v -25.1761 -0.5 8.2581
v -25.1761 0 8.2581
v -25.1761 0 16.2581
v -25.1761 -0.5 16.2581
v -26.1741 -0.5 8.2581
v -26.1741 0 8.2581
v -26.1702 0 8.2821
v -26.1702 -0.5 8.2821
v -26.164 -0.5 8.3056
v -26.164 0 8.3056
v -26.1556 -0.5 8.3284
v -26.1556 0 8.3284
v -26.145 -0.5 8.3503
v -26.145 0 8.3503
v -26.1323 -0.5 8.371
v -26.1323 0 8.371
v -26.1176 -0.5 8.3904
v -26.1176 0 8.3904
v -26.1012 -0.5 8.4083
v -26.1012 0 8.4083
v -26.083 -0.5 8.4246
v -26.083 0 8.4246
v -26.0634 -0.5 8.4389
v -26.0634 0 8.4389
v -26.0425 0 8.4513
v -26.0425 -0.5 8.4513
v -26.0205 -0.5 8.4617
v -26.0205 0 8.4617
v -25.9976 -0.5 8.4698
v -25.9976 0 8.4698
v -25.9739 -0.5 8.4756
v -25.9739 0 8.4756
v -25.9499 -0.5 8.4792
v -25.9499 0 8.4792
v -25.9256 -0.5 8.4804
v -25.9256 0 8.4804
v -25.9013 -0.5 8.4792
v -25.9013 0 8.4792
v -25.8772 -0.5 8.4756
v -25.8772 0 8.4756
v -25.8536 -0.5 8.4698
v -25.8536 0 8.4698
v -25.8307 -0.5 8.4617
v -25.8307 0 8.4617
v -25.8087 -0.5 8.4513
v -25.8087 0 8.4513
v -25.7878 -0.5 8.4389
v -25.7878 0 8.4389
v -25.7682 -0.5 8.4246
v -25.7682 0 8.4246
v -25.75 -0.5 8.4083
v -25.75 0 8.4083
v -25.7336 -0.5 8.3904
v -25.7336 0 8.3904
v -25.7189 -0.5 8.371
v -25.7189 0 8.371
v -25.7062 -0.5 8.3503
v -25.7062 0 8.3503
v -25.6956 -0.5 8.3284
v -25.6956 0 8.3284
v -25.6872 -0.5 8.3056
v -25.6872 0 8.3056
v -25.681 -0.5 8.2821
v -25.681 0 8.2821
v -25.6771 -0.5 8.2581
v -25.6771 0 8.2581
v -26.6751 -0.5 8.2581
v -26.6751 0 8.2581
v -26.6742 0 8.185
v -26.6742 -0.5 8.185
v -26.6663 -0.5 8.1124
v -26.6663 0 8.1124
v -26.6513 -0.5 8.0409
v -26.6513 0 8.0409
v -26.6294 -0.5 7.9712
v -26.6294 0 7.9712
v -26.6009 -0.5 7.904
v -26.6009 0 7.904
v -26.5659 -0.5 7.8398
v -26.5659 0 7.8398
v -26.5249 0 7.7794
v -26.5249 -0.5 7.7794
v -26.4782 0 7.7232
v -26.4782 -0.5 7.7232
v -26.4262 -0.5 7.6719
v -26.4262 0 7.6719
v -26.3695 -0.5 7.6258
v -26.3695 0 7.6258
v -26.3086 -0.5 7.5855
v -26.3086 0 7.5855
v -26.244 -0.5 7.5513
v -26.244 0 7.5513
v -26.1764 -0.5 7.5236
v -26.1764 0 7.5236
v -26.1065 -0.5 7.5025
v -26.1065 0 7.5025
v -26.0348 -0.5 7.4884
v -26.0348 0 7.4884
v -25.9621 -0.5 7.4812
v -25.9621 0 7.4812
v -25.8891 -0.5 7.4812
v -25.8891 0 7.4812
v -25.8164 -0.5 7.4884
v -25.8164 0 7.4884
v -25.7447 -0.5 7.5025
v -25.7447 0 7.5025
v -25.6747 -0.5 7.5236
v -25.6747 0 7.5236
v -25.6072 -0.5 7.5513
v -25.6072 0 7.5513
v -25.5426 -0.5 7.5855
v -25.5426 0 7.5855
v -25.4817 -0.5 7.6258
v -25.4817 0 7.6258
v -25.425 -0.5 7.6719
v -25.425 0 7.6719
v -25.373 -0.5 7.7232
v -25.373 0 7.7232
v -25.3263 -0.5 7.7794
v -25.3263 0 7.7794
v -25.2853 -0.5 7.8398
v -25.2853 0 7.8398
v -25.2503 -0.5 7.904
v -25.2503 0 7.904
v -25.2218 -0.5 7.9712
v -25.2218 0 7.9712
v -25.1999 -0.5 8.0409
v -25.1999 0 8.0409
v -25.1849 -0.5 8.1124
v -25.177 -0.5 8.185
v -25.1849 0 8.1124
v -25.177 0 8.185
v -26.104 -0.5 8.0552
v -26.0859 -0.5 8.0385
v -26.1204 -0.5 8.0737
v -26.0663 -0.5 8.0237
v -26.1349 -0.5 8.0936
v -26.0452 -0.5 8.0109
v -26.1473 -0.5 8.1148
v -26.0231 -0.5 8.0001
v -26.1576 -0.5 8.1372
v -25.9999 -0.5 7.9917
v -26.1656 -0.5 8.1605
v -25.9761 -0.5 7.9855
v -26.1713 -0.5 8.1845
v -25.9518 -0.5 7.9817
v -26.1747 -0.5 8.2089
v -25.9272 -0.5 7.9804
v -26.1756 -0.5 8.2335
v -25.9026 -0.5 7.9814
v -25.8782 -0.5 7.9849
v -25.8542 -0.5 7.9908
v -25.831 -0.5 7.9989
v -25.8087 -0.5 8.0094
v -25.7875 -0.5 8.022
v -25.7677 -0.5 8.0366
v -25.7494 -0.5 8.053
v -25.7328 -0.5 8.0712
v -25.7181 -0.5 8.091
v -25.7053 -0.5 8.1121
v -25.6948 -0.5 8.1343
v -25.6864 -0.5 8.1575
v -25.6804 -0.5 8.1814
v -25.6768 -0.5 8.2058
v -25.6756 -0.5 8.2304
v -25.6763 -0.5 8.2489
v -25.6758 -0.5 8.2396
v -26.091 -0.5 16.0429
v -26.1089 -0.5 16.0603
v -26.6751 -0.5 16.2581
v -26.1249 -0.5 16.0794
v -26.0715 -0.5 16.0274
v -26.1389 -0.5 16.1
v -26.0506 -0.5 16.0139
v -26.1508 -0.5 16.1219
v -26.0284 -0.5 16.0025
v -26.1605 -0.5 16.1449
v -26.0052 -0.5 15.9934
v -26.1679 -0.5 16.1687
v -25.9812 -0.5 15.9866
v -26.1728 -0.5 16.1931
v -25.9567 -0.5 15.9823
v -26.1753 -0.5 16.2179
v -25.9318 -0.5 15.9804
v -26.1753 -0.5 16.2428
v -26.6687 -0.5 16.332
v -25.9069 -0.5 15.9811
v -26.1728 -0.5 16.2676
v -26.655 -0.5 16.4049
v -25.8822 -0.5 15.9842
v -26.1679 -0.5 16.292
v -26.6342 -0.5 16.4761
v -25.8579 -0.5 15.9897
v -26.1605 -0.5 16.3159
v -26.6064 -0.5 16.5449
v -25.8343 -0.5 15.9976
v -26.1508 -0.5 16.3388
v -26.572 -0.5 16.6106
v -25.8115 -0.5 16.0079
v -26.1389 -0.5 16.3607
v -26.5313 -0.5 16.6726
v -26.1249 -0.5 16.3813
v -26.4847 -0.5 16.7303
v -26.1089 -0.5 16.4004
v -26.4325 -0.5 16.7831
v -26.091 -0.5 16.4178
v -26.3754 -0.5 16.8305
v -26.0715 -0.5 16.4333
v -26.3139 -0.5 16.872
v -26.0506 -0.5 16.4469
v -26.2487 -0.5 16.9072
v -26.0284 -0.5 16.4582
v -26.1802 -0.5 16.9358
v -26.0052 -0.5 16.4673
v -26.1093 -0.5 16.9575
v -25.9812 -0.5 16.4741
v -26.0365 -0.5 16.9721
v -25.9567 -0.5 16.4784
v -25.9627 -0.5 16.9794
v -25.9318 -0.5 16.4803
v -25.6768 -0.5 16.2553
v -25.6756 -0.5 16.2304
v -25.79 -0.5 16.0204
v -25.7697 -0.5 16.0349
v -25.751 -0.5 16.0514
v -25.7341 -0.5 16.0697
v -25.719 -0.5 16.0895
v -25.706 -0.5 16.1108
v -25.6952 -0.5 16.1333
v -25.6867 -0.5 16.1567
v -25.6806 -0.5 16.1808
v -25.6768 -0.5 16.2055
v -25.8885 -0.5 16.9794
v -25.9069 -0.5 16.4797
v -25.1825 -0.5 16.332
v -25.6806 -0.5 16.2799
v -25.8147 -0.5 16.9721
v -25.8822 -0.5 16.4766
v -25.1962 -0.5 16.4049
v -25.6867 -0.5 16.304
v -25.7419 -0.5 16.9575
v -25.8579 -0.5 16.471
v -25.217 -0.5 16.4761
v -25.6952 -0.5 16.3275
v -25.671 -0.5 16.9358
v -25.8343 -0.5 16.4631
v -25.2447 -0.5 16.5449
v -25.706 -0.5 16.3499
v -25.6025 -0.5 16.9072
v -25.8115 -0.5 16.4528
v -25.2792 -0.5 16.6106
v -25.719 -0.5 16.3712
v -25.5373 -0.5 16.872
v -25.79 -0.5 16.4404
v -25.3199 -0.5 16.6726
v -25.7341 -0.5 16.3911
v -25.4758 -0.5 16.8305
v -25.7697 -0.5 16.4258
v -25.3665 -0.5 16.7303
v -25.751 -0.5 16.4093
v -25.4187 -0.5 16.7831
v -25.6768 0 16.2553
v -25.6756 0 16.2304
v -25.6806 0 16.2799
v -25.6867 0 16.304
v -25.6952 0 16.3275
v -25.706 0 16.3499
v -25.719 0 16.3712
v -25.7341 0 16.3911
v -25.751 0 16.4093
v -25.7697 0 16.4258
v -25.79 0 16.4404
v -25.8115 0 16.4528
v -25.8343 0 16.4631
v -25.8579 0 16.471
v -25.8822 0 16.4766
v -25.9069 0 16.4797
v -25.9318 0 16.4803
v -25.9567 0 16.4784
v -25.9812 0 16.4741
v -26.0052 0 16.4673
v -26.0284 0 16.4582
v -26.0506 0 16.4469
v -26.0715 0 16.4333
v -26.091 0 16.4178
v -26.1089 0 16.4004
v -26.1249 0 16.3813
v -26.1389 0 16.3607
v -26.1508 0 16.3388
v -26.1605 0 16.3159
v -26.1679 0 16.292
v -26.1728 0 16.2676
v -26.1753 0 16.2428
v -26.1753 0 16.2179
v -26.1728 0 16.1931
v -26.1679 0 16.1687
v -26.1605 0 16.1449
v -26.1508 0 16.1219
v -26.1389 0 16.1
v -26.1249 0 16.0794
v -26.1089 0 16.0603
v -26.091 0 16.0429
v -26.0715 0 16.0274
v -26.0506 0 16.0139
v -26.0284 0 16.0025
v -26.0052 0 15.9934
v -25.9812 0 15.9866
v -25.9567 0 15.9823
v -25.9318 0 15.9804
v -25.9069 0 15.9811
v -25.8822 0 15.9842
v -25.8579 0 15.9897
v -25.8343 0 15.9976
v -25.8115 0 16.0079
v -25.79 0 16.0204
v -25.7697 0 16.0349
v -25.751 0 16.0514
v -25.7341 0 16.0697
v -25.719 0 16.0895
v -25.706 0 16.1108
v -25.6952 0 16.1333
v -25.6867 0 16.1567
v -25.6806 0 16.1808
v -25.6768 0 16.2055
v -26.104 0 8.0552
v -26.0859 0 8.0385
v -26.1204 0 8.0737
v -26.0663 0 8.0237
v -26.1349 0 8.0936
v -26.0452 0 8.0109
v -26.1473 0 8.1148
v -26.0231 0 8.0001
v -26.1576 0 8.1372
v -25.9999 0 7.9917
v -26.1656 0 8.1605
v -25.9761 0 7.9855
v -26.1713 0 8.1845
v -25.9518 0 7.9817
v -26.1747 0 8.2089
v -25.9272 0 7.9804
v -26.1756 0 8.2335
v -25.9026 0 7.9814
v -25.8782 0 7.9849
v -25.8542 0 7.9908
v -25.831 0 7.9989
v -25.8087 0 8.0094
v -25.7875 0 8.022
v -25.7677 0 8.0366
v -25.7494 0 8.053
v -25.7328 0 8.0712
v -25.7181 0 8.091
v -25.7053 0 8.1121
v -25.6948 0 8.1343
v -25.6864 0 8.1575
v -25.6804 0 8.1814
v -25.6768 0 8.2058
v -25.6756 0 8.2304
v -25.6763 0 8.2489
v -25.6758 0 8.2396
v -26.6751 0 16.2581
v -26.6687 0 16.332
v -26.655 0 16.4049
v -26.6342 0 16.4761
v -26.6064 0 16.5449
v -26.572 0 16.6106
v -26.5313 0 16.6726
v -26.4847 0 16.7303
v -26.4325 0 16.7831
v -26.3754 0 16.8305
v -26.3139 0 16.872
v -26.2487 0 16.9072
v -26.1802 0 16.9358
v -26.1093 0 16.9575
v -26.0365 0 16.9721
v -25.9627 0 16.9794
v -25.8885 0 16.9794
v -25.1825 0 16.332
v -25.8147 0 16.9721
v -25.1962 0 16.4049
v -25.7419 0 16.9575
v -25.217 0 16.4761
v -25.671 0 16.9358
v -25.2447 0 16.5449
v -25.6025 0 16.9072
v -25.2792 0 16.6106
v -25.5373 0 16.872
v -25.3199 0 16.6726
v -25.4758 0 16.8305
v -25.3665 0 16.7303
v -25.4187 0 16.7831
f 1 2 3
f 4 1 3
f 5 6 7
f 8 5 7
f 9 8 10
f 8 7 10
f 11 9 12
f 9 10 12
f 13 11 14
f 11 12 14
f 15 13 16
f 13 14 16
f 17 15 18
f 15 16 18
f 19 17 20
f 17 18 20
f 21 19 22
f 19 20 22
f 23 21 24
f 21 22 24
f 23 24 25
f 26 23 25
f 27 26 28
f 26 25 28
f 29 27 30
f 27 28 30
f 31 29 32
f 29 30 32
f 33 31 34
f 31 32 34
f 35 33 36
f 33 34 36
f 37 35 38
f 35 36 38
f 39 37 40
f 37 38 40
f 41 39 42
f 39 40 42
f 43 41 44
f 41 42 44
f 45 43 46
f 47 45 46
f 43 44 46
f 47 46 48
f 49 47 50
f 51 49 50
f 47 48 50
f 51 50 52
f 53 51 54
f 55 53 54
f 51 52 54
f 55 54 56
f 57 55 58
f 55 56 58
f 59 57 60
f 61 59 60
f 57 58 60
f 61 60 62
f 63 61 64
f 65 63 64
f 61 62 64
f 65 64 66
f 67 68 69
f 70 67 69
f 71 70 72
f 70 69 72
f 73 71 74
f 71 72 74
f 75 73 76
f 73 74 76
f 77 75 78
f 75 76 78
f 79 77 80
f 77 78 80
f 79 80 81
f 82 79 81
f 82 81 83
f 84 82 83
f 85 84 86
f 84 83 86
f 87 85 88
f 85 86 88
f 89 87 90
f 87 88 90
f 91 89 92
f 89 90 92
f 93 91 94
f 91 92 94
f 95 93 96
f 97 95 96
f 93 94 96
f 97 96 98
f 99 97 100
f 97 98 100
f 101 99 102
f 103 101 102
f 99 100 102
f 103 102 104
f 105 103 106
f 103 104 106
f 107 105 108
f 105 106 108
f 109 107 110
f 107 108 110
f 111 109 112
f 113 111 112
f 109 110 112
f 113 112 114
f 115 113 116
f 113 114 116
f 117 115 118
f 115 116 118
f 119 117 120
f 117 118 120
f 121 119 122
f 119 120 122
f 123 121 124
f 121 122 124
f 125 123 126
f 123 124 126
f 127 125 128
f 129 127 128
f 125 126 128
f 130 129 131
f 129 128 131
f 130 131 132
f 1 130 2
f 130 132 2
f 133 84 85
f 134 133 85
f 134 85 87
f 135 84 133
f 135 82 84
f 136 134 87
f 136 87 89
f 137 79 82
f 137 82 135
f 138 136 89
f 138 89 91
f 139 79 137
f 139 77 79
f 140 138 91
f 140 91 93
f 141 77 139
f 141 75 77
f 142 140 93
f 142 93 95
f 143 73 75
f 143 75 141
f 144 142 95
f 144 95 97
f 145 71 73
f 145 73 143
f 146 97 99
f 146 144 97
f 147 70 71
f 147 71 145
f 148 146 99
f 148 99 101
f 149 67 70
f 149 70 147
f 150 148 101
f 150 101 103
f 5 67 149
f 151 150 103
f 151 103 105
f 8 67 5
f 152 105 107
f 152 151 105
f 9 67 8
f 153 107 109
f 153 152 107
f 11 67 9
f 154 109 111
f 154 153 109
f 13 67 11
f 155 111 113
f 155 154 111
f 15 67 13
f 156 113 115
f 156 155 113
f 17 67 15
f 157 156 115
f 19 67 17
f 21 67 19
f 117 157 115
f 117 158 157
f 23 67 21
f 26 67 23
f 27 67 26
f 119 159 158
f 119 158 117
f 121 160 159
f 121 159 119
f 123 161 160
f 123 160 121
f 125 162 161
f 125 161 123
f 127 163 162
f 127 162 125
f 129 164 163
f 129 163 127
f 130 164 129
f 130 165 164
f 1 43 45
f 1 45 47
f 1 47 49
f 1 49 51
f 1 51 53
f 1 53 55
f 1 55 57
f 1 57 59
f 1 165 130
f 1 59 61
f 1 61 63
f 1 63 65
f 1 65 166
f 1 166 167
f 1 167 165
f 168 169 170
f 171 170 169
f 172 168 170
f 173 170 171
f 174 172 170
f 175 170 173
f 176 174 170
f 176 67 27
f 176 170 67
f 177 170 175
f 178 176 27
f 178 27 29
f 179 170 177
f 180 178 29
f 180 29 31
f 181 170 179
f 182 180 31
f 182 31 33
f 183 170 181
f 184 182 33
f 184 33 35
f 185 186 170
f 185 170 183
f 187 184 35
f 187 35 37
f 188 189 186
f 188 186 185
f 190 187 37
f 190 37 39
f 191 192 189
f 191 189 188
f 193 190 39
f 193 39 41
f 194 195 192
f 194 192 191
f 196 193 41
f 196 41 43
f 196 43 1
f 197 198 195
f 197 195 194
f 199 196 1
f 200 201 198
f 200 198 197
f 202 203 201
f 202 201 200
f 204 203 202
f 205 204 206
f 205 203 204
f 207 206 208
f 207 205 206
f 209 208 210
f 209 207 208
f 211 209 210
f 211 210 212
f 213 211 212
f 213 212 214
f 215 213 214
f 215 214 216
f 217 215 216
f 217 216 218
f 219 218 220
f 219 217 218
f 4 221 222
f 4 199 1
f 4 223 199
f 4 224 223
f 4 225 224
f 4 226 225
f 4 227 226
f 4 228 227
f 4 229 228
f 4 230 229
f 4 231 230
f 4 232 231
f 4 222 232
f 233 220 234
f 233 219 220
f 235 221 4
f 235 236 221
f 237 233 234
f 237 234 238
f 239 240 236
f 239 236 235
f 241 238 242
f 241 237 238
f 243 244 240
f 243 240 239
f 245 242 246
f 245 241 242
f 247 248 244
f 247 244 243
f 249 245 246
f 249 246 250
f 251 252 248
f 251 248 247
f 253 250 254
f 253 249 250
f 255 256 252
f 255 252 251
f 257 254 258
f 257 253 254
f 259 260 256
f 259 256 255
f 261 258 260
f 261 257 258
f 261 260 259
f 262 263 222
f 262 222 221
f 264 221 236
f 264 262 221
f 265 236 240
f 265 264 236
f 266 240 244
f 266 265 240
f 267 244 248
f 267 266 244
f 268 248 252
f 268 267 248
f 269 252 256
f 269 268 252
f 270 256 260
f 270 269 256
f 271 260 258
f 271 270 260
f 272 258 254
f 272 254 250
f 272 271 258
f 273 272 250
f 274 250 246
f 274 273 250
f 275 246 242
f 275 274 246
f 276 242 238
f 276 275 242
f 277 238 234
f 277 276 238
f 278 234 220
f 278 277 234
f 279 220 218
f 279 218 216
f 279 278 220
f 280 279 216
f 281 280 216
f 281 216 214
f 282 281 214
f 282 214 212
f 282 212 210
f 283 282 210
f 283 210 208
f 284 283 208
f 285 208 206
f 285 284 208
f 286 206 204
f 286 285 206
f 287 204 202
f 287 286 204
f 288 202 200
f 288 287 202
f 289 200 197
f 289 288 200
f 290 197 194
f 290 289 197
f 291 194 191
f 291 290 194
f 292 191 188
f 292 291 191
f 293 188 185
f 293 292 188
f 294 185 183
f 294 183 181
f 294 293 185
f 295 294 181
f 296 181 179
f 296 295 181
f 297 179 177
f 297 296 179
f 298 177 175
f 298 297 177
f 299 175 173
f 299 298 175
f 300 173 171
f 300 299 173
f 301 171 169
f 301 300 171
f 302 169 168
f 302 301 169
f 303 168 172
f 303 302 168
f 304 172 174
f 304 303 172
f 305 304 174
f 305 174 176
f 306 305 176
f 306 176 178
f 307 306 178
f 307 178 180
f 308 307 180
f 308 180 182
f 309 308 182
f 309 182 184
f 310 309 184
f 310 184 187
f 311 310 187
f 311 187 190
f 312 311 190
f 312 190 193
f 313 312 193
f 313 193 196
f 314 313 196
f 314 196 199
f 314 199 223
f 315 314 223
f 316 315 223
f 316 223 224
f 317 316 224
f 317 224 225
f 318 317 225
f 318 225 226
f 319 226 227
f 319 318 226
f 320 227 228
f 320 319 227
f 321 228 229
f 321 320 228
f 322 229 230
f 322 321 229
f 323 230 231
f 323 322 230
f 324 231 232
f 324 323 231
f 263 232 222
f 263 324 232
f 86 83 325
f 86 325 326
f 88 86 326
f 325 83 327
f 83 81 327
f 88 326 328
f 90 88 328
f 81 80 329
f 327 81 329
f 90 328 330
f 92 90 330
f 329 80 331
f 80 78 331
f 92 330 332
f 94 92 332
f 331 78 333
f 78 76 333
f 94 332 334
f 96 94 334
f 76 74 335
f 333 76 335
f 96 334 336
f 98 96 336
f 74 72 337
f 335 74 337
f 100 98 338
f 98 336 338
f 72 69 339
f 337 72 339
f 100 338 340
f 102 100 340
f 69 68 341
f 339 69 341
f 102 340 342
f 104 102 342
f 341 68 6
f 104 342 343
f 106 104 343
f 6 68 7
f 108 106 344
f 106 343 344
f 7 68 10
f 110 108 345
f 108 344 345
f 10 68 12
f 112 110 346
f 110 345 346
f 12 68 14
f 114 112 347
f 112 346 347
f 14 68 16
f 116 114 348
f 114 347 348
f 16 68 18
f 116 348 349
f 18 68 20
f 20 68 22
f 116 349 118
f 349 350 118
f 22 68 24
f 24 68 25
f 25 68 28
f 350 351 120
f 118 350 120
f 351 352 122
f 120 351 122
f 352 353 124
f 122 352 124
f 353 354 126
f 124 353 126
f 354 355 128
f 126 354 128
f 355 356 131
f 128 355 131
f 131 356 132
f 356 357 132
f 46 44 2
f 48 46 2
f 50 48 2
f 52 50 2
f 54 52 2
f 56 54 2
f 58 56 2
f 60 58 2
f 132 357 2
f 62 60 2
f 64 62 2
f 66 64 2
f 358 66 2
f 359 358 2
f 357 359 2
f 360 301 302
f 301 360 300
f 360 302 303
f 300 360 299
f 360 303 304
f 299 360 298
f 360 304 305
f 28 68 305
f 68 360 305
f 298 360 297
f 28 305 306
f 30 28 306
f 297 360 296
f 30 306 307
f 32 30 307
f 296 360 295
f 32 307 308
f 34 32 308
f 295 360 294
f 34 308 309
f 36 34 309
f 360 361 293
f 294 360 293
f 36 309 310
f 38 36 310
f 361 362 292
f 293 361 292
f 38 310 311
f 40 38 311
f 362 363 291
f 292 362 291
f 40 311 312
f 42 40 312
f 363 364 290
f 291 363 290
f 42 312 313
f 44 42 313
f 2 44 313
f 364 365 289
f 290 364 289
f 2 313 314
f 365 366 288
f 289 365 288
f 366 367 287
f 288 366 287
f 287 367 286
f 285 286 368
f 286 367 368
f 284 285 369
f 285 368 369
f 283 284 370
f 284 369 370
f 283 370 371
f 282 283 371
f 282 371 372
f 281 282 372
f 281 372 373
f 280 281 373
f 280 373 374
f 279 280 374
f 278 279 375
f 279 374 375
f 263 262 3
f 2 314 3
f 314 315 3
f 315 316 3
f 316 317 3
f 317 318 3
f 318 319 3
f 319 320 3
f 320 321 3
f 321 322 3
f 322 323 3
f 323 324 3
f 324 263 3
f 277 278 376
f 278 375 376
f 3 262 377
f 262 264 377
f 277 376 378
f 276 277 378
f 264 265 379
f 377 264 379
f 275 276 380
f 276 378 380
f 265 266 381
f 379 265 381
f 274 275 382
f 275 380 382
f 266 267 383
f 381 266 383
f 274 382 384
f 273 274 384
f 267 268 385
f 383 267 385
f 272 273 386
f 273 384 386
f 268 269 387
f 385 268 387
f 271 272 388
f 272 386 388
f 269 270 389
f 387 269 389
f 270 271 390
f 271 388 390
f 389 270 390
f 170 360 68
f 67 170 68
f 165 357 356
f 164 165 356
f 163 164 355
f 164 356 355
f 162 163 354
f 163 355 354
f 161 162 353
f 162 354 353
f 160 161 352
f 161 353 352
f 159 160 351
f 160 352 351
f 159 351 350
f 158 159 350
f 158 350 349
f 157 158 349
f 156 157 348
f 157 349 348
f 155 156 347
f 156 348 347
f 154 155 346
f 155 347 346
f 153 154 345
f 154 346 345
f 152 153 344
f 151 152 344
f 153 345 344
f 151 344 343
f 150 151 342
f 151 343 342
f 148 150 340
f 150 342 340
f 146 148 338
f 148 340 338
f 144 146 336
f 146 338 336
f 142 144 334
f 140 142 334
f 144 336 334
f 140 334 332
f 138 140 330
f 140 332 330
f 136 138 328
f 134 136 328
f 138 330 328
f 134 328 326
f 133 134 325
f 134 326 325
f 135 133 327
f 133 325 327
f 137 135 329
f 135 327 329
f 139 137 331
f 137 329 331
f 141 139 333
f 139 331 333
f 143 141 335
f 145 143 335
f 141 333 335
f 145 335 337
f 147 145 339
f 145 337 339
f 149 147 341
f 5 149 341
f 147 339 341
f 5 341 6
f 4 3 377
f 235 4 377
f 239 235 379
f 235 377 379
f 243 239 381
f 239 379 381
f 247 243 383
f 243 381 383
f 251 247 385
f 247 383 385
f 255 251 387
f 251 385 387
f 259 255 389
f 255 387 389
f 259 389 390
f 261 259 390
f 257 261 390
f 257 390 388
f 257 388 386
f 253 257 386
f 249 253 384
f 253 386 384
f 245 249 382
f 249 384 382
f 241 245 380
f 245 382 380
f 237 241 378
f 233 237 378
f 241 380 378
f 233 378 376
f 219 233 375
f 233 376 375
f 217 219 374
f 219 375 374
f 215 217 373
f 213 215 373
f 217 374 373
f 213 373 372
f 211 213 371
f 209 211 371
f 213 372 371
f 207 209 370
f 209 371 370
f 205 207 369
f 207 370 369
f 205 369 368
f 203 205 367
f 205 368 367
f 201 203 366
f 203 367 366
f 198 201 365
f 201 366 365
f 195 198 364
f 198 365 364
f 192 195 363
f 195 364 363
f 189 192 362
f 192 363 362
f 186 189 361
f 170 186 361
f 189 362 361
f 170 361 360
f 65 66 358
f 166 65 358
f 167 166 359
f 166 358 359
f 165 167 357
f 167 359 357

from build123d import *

# Parameters (mm, degrees)
F0_R     = 0.25
F1_DEPTH = 0.5


# Not quite as in the source:
# - a feature names something its author has since deleted; it is built from what else it names


with BuildPart() as f1:
    # F0 (on Front) → F1 (new body)
    with BuildSketch(Plane.XZ):
        with BuildLine():
            Line((-25.6771374932, 8.2580658644), (-25.1761093938, 8.2580658644))
            Line((-25.1761093938, 8.2580658644), (-25.1761093938, 16.2026529417))
            Line((-25.1761093938, 16.2026529417), (-25.1761093938, 16.2580658644))
            ThreePointArc((-25.1761093938, 16.2580658644), (-25.9255974538, 16.9803594031), (-26.6750855137, 16.2580658644))
            Line((-26.6750855137, 16.2580658644), (-26.6750855137, 16.2026529417))
            Line((-26.6750855137, 16.2026529417), (-26.6750855137, 8.2580658644))
            Line((-26.6750855137, 8.2580658644), (-26.1740574143, 8.2580658644))
            ThreePointArc((-26.1740574143, 8.2580658644), (-25.9255974538, 8.4803594031), (-25.6771374932, 8.2580658644))
        make_face()
        with Locations((-25.9255974538, 16.2303594031)):
            Circle(F0_R, mode=Mode.SUBTRACT)
        with BuildLine():
            ThreePointArc((-26.6750855137, 8.2580658644), (-25.9255974538, 7.4803594031), (-25.1761093938, 8.2580658644))
            Line((-25.1761093938, 8.2580658644), (-25.6771374932, 8.2580658644))
            ThreePointArc((-25.6771374932, 8.2580658644), (-25.6759827606, 8.2442340177), (-25.6755974538, 8.2303594031))
            ThreePointArc((-25.6755974538, 8.2303594031), (-25.9394720684, 7.9807447099), (-26.1740574143, 8.2580658644))
            Line((-26.1740574143, 8.2580658644), (-26.6750855137, 8.2580658644))
        make_face()
    extrude(amount=F1_DEPTH)


solid = f1.part
